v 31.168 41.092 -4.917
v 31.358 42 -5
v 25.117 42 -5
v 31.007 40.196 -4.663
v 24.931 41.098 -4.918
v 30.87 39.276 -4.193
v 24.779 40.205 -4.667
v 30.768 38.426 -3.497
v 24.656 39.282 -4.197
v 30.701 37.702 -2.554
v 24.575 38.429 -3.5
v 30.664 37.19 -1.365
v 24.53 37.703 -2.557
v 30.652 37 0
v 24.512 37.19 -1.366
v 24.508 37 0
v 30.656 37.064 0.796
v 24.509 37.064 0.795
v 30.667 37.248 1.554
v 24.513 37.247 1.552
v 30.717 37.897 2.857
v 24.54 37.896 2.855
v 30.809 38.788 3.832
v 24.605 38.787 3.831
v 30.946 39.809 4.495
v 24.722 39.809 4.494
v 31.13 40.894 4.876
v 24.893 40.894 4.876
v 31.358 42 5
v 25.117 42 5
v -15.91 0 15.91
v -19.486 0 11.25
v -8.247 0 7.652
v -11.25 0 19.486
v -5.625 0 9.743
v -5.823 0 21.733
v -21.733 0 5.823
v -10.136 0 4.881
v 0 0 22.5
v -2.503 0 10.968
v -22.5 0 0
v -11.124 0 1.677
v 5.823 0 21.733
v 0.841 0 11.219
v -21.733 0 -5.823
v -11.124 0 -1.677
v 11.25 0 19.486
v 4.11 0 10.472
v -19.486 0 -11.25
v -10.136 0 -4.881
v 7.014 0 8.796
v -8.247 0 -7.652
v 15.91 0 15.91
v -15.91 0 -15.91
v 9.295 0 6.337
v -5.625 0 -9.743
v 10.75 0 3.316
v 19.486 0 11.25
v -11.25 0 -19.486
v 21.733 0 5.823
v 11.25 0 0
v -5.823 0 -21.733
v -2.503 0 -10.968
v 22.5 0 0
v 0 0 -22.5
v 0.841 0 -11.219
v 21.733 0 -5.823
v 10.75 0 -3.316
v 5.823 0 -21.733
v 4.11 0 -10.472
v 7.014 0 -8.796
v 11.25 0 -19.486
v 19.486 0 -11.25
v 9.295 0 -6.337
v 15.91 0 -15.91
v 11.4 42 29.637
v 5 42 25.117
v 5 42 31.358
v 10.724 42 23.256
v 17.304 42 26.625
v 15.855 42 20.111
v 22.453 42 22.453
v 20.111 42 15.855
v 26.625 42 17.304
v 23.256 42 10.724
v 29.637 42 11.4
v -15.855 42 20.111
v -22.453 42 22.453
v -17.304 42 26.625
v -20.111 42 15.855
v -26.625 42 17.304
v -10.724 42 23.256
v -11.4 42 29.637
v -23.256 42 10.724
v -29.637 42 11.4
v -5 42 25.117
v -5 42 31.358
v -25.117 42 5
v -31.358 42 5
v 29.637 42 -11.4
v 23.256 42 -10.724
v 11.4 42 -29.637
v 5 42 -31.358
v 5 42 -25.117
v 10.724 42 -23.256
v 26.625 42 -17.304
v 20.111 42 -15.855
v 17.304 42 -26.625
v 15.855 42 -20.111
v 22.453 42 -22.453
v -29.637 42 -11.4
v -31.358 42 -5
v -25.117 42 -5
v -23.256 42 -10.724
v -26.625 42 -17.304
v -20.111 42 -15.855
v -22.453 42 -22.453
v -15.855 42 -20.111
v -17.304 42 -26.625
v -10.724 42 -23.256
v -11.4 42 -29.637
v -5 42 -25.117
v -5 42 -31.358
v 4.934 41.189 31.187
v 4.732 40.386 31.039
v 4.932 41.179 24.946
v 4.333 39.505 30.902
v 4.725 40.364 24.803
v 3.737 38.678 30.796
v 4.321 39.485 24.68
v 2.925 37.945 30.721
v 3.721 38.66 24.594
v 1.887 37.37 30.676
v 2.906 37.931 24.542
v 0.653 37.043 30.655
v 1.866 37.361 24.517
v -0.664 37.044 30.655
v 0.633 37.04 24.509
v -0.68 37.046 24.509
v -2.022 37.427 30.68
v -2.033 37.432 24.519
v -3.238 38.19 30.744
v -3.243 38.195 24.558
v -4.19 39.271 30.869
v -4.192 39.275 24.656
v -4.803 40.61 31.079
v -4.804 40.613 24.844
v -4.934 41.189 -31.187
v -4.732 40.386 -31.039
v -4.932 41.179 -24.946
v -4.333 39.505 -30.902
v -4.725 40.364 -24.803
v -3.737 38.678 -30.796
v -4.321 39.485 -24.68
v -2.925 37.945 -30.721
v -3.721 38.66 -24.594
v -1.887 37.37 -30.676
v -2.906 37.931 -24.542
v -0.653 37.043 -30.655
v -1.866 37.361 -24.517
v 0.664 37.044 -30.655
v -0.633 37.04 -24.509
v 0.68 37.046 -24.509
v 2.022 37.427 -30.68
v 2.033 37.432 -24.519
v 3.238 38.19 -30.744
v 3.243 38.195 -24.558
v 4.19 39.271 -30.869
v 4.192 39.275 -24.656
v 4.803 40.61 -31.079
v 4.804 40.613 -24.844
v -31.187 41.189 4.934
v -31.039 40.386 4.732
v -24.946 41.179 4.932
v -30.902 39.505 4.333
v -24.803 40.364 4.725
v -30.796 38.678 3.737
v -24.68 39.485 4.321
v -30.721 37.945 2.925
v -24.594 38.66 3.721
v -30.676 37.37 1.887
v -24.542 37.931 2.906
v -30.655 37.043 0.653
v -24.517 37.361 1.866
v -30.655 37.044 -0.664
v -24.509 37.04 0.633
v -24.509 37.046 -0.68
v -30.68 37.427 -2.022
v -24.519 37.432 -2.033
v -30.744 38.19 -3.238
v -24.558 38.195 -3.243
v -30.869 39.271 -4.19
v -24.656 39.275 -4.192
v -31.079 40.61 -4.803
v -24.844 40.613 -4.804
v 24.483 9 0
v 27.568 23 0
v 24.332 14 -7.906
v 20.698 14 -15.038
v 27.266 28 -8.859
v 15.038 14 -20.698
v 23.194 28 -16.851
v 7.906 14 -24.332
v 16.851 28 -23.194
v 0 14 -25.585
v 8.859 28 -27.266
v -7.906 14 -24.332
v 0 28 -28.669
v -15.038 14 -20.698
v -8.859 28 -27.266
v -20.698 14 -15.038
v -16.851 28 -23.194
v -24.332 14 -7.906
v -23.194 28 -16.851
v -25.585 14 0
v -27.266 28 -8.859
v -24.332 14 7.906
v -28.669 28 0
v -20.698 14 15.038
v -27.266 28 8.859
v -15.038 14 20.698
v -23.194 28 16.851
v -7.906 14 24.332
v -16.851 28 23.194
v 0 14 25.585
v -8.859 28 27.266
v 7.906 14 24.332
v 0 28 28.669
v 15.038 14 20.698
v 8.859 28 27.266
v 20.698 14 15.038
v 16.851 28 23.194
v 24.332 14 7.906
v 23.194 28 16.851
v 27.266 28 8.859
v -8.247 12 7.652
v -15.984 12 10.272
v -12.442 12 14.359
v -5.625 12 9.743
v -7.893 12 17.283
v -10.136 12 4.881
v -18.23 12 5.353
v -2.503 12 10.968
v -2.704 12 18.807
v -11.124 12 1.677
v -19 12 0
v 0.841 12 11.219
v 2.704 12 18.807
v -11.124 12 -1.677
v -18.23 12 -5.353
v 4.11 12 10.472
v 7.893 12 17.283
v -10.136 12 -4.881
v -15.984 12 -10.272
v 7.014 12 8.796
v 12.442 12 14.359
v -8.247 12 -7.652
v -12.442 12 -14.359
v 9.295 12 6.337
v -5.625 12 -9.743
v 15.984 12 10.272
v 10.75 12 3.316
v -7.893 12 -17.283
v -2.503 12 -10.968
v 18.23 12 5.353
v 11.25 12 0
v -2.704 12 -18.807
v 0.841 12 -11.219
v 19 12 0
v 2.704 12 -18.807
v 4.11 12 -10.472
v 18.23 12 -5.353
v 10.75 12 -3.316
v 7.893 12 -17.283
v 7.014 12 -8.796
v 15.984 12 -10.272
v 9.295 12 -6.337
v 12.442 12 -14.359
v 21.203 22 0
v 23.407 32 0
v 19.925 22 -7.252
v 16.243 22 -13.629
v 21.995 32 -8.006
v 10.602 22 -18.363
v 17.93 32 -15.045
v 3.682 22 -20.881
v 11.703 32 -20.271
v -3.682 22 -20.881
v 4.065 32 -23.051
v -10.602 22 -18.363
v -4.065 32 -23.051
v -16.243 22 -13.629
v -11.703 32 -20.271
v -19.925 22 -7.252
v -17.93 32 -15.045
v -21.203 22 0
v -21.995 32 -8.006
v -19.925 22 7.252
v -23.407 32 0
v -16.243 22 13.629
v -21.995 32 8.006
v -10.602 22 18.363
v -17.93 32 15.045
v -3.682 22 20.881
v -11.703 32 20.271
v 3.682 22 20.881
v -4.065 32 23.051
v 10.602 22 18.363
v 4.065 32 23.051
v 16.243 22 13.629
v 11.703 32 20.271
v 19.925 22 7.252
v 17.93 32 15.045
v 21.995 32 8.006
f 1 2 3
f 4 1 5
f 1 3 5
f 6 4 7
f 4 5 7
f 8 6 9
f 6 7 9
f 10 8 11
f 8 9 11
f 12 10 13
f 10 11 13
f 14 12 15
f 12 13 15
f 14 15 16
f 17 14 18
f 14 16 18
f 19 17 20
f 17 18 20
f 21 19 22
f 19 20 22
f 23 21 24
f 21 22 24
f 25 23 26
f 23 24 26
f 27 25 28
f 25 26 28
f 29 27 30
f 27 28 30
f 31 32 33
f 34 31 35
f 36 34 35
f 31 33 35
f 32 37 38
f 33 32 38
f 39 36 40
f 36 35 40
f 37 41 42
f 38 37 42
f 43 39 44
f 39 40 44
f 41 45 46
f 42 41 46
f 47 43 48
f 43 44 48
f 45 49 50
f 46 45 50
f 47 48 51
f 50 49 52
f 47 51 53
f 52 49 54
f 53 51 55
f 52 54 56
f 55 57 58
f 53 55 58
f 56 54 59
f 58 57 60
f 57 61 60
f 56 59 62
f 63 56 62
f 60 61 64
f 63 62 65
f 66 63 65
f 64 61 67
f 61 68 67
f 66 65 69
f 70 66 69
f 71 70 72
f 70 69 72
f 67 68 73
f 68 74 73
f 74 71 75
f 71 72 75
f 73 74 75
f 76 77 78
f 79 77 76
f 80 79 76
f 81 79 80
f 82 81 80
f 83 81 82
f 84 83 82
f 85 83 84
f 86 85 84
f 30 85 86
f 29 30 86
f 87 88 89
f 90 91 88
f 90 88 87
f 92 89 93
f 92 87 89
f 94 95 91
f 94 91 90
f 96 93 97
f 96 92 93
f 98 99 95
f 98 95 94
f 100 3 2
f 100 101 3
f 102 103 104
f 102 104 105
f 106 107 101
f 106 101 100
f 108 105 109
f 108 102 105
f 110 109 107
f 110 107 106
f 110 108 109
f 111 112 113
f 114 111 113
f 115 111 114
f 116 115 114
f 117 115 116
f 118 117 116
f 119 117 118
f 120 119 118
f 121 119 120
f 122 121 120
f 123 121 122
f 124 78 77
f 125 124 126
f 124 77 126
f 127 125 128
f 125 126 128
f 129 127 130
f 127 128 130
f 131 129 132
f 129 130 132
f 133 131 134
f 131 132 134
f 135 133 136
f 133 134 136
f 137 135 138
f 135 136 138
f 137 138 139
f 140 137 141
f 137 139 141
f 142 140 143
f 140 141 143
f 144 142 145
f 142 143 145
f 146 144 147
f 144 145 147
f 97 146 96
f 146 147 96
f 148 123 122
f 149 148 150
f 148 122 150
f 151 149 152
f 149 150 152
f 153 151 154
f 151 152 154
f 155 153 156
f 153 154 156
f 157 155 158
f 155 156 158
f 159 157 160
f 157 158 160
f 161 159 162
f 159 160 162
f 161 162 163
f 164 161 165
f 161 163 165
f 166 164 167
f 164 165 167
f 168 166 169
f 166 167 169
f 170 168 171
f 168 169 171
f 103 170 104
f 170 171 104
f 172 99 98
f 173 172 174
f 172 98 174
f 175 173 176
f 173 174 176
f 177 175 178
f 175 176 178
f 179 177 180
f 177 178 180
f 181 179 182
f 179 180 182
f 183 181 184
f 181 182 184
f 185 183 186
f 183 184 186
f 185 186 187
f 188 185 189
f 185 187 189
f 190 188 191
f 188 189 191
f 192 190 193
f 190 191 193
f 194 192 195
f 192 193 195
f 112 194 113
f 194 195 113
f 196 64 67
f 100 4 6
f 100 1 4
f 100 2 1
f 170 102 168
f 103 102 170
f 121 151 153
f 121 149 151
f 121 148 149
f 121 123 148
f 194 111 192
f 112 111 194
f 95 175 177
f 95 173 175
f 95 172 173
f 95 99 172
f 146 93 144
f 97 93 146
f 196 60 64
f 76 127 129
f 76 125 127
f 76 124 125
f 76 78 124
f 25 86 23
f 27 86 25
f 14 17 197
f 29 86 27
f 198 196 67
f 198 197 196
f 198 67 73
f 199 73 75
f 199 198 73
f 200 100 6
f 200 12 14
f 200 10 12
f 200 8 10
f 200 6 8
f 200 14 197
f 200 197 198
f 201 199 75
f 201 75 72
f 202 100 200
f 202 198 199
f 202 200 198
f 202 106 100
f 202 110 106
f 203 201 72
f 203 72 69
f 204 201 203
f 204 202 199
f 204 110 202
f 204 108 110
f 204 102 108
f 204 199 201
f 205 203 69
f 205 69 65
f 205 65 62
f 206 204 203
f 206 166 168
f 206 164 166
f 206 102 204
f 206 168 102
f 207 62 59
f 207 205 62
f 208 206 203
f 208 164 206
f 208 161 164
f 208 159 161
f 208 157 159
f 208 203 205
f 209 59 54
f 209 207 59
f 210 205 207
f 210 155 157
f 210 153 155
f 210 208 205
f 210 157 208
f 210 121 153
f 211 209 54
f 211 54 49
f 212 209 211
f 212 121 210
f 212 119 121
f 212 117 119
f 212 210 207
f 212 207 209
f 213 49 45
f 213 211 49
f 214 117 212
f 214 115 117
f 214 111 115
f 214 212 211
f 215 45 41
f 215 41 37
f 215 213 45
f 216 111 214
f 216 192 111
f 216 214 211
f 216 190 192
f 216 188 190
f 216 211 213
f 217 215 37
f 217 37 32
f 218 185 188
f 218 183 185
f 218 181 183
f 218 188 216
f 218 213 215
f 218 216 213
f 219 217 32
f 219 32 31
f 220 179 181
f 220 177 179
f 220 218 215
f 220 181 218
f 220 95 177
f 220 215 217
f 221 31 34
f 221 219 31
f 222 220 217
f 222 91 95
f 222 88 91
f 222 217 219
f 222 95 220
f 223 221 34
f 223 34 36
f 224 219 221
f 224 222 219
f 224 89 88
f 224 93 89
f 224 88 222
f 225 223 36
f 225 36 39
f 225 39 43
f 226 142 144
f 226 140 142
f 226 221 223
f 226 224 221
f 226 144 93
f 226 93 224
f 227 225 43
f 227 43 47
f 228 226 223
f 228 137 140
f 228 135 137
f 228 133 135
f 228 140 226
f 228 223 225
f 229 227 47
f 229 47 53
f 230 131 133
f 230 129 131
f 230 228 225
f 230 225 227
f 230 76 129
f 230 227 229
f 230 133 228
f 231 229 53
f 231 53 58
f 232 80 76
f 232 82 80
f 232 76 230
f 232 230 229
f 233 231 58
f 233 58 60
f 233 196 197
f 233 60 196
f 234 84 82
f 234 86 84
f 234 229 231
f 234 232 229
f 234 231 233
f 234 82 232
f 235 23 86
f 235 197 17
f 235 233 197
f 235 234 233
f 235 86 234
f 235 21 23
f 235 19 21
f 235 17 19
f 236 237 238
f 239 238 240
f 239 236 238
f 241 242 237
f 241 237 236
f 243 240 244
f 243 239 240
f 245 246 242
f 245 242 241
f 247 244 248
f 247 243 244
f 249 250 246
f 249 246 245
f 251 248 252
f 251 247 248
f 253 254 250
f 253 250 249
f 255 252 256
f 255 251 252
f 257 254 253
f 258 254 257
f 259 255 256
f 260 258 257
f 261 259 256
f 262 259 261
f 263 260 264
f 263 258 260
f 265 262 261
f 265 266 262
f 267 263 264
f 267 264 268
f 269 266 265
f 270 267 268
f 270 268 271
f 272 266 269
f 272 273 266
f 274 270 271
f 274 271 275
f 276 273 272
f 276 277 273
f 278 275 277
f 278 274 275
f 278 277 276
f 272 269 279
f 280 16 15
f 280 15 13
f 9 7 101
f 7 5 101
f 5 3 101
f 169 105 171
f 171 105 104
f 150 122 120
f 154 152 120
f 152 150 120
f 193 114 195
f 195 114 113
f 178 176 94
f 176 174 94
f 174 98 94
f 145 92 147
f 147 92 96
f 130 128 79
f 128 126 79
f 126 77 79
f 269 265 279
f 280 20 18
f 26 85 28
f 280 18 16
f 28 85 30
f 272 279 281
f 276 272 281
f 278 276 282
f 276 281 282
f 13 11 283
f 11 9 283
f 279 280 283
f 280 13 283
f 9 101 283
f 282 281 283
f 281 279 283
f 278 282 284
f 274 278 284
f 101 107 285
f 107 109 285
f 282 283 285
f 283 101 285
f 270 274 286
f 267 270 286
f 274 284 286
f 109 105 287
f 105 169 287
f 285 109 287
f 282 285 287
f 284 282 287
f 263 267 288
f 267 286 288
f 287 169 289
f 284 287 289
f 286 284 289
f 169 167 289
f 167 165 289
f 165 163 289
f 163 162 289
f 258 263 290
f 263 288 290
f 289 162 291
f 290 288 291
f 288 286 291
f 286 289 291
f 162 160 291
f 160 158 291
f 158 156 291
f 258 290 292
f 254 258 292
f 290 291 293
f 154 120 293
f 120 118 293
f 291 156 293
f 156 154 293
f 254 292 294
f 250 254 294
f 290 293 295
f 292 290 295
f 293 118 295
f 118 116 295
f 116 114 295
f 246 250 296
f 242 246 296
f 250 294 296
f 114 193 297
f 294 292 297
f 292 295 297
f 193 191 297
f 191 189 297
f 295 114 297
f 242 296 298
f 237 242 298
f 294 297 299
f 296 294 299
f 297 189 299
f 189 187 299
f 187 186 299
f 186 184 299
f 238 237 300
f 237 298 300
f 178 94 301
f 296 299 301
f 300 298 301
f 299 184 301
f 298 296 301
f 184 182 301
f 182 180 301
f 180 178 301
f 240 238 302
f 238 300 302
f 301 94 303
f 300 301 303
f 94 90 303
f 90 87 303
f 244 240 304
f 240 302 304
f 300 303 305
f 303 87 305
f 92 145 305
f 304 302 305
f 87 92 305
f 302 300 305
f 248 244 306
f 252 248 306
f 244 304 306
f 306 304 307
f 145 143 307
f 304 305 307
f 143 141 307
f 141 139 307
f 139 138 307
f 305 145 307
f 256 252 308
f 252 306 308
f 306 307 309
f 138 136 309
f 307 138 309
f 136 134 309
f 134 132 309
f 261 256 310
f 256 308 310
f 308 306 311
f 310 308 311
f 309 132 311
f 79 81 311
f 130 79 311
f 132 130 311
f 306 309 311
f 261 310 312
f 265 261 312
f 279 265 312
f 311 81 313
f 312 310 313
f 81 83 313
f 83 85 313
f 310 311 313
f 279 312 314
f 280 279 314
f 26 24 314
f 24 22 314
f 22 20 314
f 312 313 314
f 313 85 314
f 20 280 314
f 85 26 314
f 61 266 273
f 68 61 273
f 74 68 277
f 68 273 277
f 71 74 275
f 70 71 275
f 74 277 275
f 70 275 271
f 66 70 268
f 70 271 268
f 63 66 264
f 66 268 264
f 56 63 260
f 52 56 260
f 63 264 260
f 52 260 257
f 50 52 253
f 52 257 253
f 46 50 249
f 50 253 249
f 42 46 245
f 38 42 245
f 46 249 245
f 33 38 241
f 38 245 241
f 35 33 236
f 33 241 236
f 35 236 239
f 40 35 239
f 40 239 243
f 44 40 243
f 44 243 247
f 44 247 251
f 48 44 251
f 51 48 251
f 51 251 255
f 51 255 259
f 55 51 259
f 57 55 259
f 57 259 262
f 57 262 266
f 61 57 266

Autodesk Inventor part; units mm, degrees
ref_plane "YZ Plane" through (0, 0, 0) normal (1, 0, 0) x (0, 1, 0)
ref_plane "XZ Plane" through (0, 0, 0) normal (0, 1, 0) x (-1, 0, 0)
ref_plane "XY Plane" through (0, 0, 0) normal (0, 0, 1) x (1, 0, 0)
sketch "Sketch3" plane through (0, 0, 0) normal (0, 0, 1) x (1, 0, 0)
  line L0 (0, 0) -> (0, 42)
  line L1 (11.25, 0) -> (11.25, 12)
  line L2 (11.25, 12) -> (19, 12)
  line L3 (19, 12) -> (25.6098, 42)
  line L4 (25.6098, 42) -> (31.7537, 42)
  line L5 (31.7537, 42) -> (22.5, 0)
  line L6 (22.5, 0) -> (11.25, 0)
  dimension "d3" = 6
  dimension "d4" = 42
  dimension "d5" = 12
  dimension "d6" = 22.5
  dimension "d7" = 45
  dimension "d8" = 38
  dimension "d9" = 63.5073
revolve "Revolution1" add sketch "Sketch3" angle 360 about axis through (0, 0, 0) along (0, 1, 0)
sketch "Sketch4" plane through (0, 0, 0) normal (0, 0, 1) x (1, 0, 0)
  line L0 (31.7537, 42) -> (-31.7537, 42) projected
  circle A0 centre (0, 42) radius 5
  point P0 (0, 0)
  dimension "d11" = 10
extrude "Extrusion2" cut sketch "Sketch4" along normal through all
pattern_circular "Circular Pattern1" count 4 over 360 about axis through (0, -10, 0) along (0, 1, 0) of "Extrusion2"
properties part number "cup" material "Steel, Cast"
